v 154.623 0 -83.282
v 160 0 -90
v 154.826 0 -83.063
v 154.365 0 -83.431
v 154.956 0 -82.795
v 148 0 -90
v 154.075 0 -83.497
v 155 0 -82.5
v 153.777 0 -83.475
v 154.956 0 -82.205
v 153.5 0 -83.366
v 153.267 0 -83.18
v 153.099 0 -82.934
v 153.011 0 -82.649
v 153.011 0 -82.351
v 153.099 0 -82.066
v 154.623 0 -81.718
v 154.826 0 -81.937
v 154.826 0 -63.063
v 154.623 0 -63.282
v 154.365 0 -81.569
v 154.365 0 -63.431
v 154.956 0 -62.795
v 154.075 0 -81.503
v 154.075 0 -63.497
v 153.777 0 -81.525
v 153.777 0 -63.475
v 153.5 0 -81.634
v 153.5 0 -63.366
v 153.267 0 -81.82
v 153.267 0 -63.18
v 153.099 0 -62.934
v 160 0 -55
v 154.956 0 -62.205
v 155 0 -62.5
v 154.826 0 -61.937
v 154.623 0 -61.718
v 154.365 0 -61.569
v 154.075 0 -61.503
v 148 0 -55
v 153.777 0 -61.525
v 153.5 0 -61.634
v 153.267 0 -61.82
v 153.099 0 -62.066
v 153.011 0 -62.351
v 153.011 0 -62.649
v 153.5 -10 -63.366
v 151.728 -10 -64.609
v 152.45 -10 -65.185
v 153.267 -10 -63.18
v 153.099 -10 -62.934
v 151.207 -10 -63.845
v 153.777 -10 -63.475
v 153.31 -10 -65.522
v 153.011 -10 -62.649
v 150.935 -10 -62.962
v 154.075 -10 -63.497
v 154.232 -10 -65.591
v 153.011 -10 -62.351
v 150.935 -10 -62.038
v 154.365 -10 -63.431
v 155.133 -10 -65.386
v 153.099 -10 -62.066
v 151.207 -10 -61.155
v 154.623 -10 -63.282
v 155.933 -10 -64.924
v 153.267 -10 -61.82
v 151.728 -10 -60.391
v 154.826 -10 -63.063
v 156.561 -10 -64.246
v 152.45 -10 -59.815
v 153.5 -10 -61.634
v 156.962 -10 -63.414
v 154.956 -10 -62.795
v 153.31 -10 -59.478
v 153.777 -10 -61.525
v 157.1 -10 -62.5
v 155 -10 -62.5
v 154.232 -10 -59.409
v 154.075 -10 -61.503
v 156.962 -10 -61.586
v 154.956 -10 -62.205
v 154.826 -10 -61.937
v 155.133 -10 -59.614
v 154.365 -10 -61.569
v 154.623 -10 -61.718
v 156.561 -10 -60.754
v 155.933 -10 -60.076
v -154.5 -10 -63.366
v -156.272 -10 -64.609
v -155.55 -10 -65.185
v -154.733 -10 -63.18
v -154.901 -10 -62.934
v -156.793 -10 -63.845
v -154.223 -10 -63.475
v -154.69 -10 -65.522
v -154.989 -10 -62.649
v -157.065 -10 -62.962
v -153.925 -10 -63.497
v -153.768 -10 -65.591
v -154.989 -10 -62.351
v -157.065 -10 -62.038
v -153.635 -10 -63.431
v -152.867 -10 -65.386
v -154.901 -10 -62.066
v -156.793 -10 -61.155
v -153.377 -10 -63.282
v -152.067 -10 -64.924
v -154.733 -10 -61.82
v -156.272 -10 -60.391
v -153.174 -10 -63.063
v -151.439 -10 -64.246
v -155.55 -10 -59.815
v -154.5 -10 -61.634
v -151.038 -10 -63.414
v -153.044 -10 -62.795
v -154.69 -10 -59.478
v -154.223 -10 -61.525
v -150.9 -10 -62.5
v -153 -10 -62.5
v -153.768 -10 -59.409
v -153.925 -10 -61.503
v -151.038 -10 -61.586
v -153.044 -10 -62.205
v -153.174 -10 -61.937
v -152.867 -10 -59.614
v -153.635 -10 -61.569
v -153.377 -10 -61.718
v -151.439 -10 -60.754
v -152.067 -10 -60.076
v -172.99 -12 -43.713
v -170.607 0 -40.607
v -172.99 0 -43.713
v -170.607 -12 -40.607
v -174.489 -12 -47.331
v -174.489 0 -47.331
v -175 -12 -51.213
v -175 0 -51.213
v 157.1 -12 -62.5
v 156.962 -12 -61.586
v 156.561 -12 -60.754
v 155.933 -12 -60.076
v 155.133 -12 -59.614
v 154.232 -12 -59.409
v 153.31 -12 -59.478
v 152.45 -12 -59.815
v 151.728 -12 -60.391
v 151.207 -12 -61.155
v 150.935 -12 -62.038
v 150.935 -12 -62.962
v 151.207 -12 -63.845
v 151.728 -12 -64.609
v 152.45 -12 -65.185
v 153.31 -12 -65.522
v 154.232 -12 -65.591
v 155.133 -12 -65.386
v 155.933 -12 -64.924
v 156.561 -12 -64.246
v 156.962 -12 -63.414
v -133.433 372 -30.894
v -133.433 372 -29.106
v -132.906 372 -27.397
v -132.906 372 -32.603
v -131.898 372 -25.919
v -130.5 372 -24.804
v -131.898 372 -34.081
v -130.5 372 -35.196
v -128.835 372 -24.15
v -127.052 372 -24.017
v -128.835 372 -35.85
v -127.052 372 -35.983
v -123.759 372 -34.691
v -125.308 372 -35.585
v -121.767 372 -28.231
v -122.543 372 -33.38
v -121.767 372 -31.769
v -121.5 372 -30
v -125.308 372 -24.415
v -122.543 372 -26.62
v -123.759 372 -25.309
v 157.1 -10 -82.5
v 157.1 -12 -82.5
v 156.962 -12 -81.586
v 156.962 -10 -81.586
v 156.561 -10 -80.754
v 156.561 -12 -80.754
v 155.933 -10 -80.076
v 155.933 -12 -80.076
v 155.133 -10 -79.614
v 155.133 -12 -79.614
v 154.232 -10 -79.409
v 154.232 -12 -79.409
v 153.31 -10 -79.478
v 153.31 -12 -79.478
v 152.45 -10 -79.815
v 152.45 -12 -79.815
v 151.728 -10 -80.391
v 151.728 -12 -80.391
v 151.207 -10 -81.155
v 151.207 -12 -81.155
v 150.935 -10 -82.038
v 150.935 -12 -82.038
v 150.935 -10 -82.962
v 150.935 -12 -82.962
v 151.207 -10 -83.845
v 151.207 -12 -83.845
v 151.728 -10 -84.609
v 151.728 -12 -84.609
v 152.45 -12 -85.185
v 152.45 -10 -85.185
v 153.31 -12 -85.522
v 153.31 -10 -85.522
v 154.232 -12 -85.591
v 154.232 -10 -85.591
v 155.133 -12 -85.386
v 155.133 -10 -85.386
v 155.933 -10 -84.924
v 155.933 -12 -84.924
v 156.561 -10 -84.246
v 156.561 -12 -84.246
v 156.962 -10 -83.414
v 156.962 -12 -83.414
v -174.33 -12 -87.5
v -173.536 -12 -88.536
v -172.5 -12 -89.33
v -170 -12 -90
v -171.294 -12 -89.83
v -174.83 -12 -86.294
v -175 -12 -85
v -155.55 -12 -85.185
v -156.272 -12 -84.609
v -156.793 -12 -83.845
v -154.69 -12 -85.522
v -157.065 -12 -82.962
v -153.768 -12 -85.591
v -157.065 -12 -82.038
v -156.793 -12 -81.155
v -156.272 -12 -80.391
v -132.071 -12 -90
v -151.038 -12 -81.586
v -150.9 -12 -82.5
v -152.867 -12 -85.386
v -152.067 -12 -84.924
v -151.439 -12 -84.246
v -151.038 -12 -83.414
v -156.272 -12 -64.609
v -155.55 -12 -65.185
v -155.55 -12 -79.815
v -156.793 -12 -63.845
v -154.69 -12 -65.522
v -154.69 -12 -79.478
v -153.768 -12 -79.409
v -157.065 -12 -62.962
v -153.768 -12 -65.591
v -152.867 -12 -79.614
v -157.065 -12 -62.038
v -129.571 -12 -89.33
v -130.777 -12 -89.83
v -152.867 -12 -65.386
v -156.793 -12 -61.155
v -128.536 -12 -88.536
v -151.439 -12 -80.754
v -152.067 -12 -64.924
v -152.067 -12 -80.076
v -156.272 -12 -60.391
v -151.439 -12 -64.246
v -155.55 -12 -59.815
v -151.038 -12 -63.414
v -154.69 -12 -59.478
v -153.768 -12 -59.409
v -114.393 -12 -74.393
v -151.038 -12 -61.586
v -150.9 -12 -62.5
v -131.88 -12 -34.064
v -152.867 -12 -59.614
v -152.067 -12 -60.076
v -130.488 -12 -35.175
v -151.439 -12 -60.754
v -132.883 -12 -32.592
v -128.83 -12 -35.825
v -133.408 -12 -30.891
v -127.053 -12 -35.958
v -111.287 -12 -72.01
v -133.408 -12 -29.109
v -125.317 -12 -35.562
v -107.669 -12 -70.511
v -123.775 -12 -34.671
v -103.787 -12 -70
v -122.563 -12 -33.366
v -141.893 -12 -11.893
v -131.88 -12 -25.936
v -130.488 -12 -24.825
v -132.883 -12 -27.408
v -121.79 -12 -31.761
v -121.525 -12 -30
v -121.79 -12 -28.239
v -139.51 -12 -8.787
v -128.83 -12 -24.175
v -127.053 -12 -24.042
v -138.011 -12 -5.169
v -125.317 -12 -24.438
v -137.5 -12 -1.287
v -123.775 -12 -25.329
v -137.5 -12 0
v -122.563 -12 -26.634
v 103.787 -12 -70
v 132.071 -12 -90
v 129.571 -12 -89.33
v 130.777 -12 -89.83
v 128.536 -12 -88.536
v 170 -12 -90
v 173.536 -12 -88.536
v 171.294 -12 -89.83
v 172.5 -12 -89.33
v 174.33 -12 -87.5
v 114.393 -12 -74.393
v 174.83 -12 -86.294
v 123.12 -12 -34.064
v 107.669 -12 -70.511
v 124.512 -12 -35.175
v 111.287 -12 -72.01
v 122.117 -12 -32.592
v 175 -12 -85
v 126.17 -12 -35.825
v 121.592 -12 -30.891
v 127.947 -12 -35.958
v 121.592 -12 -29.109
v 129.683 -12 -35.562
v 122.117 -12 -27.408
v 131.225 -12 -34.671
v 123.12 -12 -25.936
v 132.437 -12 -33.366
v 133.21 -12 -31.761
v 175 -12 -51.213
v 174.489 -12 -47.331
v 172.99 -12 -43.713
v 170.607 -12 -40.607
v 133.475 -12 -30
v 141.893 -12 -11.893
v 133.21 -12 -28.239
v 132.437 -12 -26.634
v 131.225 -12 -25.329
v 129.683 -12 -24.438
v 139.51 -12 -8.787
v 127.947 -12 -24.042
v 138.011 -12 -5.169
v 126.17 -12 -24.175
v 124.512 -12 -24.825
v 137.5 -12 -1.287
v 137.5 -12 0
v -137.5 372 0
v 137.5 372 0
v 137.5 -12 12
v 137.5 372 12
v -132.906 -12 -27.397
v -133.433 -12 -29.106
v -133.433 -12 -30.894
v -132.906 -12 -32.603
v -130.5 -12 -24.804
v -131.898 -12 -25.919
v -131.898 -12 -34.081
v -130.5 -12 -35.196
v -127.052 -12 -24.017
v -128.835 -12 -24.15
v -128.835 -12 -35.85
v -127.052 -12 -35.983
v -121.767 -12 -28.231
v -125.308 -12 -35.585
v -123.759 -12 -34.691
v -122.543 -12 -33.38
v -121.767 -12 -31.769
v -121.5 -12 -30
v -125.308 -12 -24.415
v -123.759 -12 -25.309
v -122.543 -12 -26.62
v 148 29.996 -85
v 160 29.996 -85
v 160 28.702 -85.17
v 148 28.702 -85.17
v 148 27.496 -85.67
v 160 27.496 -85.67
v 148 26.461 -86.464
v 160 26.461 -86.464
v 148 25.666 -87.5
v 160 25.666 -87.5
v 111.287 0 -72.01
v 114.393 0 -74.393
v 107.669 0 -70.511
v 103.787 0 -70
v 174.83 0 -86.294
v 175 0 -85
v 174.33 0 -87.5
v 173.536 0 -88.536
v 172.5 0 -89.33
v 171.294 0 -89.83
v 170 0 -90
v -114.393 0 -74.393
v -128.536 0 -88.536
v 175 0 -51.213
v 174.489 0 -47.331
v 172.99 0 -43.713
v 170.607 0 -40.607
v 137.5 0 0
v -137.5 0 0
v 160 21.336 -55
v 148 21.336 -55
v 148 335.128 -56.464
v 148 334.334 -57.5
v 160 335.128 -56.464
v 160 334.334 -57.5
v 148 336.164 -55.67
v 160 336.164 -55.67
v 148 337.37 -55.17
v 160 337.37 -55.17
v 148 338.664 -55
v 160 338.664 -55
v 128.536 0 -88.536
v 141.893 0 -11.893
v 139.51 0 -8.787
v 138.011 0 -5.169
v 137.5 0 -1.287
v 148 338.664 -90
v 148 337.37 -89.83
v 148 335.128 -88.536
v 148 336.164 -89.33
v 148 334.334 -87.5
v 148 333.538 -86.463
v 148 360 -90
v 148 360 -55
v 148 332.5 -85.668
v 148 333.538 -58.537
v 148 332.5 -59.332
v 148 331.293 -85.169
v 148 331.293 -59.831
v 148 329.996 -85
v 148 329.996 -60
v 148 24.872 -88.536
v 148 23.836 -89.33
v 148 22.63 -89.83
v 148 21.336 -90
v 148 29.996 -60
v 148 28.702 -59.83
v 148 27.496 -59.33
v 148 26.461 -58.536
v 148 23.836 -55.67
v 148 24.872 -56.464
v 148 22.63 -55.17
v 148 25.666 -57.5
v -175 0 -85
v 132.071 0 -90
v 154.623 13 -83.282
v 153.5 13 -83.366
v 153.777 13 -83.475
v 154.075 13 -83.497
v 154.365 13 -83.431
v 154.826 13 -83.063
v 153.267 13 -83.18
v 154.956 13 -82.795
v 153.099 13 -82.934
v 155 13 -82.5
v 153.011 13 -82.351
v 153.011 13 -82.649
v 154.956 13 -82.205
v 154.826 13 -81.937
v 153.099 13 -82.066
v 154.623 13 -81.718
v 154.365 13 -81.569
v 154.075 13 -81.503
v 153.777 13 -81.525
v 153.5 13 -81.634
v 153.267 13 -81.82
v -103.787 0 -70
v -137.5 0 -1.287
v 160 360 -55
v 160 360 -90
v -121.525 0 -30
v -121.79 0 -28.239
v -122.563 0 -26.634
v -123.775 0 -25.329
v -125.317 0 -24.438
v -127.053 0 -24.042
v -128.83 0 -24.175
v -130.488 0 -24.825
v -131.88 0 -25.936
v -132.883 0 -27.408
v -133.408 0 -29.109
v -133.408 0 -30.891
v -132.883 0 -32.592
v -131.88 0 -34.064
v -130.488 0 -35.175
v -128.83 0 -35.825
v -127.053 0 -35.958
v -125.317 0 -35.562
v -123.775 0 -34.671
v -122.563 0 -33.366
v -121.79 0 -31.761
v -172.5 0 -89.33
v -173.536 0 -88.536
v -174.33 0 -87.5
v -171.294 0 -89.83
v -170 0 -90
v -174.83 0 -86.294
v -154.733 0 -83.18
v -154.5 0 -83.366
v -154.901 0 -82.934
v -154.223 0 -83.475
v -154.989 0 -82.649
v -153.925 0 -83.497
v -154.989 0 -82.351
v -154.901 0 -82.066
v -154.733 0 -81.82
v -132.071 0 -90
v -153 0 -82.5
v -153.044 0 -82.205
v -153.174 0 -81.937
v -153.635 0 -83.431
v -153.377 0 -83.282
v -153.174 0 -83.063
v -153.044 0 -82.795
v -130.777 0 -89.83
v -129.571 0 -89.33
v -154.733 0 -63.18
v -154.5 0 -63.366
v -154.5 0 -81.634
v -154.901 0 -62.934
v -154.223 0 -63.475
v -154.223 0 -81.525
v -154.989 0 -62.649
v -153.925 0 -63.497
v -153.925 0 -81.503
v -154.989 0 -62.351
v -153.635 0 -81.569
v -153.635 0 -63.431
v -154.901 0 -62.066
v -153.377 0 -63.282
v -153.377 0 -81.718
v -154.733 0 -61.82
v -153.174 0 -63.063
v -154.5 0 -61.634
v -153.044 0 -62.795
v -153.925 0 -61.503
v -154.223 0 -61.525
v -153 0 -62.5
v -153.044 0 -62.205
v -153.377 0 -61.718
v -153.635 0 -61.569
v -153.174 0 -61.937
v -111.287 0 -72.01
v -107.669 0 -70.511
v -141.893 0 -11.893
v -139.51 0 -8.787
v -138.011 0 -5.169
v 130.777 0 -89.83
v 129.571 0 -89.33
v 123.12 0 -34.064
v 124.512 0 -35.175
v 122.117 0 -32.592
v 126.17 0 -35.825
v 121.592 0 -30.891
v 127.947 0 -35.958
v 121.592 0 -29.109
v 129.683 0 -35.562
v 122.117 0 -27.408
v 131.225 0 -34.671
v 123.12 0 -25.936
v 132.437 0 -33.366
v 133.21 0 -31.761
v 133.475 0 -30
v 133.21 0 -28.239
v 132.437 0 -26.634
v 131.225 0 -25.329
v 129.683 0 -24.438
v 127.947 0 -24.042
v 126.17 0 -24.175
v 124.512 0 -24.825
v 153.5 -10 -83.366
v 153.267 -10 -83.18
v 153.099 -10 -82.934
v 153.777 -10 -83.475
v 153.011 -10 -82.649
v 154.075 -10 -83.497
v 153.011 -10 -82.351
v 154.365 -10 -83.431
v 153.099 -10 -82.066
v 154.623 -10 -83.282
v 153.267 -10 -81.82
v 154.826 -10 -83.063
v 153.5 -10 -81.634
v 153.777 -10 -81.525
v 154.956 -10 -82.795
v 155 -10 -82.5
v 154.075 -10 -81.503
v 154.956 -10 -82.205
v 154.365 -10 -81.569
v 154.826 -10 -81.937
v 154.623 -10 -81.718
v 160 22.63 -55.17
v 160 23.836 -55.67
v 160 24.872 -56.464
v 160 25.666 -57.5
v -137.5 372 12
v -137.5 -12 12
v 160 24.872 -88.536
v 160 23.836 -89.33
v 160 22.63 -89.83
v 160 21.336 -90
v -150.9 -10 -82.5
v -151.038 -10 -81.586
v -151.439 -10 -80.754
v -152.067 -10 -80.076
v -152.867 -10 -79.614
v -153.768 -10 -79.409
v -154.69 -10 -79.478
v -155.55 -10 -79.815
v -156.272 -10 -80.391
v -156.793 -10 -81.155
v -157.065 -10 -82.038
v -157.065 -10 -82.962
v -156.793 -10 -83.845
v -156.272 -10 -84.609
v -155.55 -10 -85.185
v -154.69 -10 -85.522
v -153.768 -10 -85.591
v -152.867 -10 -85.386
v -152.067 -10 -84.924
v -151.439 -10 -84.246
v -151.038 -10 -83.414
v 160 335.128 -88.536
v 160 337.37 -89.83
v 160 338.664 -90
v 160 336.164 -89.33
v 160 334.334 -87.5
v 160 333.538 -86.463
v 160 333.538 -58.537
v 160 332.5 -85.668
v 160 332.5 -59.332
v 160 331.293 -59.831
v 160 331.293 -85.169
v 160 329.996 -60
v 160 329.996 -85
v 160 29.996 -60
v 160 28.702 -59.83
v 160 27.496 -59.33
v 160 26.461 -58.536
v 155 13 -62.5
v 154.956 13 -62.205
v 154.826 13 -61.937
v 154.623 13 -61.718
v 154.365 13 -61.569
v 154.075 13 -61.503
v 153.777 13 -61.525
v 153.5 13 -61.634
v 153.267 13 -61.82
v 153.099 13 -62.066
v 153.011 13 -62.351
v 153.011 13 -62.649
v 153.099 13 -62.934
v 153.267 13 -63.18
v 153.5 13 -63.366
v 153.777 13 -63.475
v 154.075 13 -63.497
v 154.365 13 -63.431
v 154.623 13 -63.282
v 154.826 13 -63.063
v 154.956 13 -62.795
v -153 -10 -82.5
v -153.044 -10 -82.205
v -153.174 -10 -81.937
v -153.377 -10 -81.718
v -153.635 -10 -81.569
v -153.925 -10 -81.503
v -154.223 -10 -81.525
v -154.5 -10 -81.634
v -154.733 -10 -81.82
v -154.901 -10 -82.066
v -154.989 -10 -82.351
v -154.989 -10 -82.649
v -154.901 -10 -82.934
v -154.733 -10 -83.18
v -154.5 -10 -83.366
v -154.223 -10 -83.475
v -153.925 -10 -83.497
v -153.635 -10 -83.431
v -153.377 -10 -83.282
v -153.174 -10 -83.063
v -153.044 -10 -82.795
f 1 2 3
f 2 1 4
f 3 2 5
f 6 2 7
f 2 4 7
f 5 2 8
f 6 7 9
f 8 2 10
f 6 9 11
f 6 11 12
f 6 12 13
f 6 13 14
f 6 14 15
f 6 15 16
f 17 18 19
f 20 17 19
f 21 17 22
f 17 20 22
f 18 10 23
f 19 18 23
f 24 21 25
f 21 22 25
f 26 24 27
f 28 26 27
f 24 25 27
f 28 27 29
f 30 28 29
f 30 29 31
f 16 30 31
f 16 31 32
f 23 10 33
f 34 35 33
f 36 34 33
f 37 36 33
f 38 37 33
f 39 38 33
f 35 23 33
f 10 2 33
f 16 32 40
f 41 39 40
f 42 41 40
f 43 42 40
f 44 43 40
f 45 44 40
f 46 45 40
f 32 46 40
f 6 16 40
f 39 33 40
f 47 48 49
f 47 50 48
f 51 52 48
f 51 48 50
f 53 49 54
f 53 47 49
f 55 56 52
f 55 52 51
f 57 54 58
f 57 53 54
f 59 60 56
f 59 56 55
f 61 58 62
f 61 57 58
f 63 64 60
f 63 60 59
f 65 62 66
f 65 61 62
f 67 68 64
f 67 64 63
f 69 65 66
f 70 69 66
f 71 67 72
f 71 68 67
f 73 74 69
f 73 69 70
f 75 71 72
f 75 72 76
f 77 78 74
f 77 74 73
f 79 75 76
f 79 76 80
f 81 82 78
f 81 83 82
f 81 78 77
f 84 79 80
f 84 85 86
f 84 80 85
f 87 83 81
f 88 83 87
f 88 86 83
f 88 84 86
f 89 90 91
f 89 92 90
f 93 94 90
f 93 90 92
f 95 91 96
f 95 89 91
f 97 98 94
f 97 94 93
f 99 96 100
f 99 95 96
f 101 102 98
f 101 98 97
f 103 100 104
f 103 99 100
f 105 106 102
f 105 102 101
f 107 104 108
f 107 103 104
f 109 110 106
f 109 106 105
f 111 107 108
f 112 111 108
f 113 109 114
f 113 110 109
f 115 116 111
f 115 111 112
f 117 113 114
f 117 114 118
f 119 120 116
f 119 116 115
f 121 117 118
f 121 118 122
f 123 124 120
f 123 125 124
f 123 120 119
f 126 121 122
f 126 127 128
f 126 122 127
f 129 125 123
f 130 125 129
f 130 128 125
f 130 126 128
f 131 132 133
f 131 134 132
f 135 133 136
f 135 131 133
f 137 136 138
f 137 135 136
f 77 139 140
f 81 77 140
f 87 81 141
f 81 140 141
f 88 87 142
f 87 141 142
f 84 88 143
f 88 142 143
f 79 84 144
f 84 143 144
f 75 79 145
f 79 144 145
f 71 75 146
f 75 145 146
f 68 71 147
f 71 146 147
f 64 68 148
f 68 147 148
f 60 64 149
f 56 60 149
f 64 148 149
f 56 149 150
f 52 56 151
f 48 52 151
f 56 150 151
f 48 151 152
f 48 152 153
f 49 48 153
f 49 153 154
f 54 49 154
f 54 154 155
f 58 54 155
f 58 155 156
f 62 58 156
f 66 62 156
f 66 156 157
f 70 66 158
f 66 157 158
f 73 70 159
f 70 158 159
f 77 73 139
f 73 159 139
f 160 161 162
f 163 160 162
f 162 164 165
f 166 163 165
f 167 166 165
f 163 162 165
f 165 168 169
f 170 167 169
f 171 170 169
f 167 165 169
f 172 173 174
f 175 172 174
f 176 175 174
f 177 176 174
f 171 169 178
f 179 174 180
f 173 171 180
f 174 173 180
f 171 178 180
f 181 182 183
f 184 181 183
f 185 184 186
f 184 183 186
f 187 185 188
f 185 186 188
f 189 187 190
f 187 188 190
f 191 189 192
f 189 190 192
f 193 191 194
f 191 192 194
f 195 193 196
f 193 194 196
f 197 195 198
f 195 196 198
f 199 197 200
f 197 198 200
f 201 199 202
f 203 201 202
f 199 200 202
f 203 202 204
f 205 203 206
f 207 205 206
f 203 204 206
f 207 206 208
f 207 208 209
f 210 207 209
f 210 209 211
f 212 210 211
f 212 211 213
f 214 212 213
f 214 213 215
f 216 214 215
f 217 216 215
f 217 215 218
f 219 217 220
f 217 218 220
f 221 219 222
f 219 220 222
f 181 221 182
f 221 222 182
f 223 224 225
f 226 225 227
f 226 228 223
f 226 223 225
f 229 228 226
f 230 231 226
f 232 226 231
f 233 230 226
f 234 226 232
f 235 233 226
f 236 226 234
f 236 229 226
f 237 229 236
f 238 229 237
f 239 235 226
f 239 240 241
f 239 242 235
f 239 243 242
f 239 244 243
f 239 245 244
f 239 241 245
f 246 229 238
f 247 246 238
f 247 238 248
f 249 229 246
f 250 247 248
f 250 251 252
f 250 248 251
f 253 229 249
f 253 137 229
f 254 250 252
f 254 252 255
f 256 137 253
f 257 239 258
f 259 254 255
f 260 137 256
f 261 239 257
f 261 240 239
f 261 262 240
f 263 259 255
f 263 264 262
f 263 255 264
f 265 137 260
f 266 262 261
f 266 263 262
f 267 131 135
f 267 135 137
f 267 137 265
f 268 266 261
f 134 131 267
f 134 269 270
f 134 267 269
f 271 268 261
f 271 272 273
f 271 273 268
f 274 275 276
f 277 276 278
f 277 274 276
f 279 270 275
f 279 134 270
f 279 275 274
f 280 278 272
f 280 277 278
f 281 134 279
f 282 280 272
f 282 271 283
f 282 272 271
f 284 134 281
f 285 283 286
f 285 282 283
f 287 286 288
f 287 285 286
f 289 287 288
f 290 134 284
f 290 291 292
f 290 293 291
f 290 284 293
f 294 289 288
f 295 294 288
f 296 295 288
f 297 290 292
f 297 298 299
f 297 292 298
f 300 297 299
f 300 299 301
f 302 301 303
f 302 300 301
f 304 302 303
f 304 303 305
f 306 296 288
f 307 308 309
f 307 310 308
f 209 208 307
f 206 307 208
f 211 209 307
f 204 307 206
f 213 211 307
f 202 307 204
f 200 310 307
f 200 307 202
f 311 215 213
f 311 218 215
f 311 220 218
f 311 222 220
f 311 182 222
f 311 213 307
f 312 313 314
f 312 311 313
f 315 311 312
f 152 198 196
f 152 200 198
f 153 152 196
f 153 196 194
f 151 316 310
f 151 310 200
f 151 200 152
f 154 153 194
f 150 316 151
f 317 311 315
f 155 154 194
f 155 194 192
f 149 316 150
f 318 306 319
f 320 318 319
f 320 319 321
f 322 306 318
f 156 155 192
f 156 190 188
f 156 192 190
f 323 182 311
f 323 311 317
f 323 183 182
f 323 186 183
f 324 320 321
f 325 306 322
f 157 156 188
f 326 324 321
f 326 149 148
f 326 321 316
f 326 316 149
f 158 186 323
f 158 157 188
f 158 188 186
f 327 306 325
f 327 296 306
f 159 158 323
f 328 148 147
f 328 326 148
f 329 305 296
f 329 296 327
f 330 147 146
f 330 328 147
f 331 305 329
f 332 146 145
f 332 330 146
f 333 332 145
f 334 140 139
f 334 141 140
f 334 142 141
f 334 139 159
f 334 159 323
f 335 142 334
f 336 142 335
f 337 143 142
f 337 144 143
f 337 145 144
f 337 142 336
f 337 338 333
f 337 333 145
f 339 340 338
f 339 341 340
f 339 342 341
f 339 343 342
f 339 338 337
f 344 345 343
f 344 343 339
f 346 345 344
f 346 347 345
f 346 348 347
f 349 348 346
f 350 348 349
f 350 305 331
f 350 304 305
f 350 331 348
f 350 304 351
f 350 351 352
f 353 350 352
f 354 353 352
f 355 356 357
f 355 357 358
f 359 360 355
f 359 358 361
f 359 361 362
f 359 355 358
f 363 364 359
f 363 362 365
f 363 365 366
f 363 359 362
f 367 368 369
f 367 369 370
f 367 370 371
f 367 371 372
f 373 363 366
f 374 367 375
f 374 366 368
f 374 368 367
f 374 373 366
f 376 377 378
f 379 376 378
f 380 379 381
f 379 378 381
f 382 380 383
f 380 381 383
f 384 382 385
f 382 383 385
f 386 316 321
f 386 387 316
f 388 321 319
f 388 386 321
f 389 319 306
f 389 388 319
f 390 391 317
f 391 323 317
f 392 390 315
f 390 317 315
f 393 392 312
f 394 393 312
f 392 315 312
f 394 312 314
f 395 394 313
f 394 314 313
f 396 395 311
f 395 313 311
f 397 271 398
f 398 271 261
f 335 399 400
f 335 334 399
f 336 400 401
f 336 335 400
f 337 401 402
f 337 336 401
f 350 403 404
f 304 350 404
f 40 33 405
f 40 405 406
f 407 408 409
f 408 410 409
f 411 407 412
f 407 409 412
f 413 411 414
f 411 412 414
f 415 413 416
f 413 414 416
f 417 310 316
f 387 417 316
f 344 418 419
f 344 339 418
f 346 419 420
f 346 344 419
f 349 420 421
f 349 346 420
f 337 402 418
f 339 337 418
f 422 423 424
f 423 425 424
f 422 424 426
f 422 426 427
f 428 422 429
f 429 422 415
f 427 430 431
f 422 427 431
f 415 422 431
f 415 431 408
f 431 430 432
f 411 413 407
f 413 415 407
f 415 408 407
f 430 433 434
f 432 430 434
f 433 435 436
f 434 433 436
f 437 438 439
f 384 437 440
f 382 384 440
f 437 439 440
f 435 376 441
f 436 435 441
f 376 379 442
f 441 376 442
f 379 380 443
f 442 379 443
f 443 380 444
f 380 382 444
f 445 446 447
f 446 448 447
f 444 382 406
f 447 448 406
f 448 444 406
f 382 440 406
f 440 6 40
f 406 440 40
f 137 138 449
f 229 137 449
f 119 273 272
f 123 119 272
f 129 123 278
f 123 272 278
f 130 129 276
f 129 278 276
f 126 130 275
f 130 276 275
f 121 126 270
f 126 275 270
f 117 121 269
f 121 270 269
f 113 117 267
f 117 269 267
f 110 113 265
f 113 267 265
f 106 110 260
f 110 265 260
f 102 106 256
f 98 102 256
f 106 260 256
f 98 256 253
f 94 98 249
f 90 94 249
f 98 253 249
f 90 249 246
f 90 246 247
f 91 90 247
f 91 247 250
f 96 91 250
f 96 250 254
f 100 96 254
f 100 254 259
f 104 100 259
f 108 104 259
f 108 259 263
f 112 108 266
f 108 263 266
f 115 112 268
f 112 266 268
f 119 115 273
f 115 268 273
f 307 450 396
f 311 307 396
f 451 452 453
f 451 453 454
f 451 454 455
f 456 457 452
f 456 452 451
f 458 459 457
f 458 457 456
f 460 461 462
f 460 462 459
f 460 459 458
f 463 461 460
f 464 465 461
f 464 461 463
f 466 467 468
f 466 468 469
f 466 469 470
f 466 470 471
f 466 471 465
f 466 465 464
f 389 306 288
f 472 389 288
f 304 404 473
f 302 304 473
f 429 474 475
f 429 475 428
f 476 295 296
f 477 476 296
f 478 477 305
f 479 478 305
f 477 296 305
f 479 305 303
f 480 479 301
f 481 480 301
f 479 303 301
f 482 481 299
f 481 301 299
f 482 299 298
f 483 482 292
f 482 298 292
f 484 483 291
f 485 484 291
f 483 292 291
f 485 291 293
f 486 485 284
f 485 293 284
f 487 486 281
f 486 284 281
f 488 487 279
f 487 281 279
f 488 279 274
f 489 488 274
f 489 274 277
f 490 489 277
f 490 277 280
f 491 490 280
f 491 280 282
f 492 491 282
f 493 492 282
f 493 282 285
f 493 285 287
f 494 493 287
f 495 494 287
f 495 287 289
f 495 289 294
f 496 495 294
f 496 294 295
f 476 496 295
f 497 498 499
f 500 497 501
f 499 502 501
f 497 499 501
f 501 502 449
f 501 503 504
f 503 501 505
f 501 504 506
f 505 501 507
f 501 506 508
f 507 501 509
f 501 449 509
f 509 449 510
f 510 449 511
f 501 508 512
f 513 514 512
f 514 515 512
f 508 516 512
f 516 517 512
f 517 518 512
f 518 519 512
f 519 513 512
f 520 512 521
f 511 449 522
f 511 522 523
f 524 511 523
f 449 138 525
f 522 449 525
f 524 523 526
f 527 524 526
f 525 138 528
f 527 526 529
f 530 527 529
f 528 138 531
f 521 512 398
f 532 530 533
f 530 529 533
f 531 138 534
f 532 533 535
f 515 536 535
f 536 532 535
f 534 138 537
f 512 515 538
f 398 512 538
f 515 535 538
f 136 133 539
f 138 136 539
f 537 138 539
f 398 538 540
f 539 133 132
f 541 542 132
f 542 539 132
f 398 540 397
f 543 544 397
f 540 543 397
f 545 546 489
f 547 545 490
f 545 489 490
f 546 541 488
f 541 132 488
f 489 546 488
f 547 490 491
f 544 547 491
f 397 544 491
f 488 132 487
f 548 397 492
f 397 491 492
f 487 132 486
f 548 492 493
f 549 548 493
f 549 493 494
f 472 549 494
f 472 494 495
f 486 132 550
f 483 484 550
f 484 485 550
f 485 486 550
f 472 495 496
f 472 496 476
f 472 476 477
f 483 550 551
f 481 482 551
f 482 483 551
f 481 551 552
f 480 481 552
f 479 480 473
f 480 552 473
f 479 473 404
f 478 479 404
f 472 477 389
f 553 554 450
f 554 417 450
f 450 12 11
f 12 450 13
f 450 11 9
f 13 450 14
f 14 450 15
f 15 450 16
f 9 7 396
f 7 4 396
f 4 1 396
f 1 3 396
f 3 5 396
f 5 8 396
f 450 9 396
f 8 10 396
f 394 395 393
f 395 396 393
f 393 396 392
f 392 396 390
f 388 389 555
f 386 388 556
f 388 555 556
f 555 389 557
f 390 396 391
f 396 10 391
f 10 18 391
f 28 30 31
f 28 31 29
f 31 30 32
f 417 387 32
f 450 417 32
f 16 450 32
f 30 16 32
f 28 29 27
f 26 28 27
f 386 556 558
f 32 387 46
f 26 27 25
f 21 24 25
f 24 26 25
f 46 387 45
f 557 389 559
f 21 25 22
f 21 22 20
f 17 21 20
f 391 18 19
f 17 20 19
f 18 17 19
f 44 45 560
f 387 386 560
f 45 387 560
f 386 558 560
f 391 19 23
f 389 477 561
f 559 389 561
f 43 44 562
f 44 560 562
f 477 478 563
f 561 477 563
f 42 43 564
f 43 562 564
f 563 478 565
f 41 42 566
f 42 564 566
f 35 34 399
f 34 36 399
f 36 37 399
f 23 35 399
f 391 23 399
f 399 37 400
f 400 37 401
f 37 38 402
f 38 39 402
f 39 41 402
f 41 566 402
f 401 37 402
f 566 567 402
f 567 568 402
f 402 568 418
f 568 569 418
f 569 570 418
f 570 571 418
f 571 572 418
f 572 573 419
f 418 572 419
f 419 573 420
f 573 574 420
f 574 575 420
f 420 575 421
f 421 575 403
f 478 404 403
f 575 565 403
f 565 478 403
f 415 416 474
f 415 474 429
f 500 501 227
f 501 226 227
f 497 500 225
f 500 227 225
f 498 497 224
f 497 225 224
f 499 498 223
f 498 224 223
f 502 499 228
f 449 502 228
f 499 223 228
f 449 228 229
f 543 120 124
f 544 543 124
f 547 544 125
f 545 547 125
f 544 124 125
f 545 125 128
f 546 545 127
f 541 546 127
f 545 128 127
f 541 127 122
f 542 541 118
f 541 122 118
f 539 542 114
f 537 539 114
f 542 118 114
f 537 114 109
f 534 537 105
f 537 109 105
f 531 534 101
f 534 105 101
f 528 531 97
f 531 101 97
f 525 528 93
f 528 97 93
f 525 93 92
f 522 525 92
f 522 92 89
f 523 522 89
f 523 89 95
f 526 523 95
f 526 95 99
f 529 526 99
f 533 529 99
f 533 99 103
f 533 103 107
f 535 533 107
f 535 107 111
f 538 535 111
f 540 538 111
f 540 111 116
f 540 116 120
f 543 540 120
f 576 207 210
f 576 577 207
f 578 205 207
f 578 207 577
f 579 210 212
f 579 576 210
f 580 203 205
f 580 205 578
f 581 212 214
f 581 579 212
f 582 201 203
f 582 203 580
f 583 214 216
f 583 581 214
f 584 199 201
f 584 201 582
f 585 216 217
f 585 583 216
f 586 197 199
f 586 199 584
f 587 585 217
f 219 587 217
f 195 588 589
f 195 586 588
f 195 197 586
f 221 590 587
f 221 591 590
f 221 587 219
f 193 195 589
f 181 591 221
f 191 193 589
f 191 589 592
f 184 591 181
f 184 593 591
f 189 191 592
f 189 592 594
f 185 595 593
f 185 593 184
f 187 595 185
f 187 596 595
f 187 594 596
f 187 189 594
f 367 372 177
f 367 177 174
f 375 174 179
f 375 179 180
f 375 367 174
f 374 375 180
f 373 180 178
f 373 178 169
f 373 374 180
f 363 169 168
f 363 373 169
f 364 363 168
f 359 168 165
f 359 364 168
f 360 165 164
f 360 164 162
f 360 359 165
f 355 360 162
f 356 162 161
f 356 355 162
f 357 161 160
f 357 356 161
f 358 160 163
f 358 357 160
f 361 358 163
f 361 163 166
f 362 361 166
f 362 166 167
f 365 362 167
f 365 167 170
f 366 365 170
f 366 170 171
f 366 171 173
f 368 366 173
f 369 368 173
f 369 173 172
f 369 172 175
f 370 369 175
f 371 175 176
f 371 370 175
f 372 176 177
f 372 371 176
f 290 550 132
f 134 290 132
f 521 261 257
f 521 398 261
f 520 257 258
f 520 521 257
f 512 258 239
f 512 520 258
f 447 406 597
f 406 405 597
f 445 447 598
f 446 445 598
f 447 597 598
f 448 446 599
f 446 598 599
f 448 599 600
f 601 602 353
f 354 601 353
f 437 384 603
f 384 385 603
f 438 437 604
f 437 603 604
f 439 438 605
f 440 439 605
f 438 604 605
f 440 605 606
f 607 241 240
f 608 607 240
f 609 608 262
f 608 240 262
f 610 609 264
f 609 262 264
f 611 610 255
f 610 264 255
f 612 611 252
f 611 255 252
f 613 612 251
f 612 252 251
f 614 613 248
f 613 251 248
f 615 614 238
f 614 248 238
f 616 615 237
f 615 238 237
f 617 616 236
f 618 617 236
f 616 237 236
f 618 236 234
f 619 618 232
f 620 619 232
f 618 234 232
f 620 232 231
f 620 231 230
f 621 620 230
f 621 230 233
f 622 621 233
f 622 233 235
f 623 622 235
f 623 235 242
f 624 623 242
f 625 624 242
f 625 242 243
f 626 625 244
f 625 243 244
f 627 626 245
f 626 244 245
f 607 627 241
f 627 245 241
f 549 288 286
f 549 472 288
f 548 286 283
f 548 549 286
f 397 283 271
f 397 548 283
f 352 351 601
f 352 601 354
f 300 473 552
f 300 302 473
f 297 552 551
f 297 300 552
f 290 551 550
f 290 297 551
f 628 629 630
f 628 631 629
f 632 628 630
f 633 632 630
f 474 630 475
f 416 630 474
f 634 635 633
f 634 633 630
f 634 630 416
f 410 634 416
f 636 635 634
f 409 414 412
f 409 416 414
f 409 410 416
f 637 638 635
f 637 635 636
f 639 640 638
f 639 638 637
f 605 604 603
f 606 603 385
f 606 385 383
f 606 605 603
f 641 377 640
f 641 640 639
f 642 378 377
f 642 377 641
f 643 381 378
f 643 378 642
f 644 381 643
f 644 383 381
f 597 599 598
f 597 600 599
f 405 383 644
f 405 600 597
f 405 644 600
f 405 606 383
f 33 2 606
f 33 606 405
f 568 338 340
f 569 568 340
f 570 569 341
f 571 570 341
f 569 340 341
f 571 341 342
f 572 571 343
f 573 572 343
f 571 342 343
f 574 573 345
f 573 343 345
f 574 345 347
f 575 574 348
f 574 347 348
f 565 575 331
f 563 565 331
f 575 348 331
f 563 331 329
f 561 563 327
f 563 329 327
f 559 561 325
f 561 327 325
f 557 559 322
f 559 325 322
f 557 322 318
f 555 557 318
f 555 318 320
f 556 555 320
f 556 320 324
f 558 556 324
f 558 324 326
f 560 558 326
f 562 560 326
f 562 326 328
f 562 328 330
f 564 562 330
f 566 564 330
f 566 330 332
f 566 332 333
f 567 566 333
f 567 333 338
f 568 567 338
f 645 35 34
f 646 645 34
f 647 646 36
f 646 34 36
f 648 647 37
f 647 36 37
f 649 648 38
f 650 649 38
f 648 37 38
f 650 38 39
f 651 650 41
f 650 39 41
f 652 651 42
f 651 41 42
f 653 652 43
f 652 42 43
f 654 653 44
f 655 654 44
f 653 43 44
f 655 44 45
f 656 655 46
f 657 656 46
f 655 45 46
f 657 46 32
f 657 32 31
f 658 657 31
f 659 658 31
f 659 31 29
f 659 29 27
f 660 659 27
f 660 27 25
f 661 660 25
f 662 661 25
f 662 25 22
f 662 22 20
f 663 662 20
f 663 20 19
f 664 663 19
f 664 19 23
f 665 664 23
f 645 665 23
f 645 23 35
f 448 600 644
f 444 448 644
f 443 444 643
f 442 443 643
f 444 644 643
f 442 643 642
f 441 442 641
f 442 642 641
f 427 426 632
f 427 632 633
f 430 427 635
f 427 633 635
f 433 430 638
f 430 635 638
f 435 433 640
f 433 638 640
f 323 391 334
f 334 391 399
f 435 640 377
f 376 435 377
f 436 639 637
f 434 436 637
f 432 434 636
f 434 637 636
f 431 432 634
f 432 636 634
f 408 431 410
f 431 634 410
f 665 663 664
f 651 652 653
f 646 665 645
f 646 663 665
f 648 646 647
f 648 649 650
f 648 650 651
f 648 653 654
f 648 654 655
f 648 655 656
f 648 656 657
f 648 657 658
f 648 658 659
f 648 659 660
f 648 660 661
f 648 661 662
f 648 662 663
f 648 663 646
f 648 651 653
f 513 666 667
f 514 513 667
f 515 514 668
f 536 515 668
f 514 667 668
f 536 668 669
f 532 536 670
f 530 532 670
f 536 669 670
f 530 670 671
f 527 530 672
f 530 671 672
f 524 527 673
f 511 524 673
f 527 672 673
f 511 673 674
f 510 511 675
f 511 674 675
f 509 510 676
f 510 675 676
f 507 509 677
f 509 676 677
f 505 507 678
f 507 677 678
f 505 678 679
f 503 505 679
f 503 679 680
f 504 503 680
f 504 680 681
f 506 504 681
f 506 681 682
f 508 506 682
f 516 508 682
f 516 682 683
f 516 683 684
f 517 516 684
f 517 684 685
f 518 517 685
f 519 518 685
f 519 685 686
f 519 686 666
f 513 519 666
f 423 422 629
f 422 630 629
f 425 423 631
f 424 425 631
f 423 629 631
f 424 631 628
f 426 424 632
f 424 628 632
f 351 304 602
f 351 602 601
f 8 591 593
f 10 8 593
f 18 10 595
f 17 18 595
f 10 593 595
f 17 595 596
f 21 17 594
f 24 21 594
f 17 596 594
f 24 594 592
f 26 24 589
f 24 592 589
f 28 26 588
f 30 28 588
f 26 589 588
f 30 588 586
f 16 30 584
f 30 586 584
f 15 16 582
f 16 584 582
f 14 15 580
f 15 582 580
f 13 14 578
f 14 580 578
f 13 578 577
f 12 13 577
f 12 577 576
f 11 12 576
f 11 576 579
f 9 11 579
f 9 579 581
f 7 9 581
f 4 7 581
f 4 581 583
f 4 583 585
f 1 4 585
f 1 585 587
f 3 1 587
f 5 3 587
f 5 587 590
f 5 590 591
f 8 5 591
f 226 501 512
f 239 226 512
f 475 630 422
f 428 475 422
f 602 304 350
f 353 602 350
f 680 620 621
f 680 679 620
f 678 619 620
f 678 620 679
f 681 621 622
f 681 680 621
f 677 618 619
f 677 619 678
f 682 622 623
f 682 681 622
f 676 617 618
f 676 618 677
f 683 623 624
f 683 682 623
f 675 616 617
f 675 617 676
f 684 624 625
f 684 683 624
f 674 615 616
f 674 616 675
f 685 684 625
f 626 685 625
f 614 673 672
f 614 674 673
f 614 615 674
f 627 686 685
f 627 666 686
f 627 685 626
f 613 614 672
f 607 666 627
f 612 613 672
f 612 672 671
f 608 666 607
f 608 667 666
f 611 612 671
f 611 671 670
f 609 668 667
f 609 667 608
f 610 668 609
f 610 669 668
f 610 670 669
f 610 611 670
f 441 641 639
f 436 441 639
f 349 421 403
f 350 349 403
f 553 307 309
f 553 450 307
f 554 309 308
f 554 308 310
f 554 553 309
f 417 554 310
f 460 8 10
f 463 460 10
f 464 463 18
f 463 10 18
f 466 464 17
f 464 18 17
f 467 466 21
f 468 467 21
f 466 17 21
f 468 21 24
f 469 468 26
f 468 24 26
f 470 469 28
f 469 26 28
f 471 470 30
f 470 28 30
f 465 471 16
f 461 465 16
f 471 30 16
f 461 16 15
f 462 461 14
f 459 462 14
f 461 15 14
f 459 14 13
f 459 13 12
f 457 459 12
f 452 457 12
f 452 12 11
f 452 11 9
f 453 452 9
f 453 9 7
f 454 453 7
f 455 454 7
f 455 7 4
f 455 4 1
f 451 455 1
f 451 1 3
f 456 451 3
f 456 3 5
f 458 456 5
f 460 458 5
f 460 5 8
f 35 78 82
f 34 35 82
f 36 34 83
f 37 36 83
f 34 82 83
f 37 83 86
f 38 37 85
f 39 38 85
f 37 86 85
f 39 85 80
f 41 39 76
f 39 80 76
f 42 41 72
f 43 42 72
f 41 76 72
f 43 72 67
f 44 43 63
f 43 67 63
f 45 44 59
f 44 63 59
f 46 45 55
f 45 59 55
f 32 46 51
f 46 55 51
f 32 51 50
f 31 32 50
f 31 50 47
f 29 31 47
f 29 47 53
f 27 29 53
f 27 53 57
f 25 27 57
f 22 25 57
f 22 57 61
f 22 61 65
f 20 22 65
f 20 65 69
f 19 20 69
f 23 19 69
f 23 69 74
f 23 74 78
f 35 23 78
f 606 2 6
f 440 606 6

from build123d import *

# Parameters (mm, degrees)
F1_DEPTH  = 12
F2_R      = 5.975
F3_DEPTH  = 25
F4_R      = 6
F5_DEPTH  = 384
F6_W      = 275
F6_H      = 384
F7_DEPTH  = 12
F8_R      = 5
F9_R      = 15
F10_W     = 12
F10_H     = 35
F11_DEPTH = 360
F12_R     = 1
F13_DEPTH = 25
F14_R     = 3.1
F15_DEPTH = 2
F17_DEPTH = 25
F18_R     = 5


with BuildPart() as f1:
    # F0 (on Front) → F1 (new body)
    with BuildSketch(Plane.XZ):
        Polygon((137.5, 0), (-137.5, 0), (-137.5, -7.5), (-175, -45), (-175, -90), (175, -90), (175, -45), (137.5, -7.5), align=None)
    extrude(amount=F1_DEPTH)

    # F2 (on face) → F3 (cut)
    with BuildSketch(Plane.XZ.offset(12)):
        with Locations((-127.5, -30)):
            Circle(F2_R)
        with Locations((127.5, -30)):
            Circle(F2_R)
        Polygon((0, -70), (-110, -70), (-130, -90), (0, -90), (130, -90), (110, -70), align=None)
    extrude(amount=-F3_DEPTH, mode=Mode.SUBTRACT)

    # F8
    f8_edges = [f1.edges().sort_by_distance(p)[0] for p in [
        (-130, -6, -90),
        (130, -6, -90),
        (175, -6, -90),
        (-175, -6, -90),
    ]]
    fillet(f8_edges, radius=F8_R)

    # F9
    f9_edges = [f1.edges().sort_by_distance(p)[0] for p in [
        (-137.5, -6, -7.5),
        (-175, -6, -45),
        (137.5, -6, -7.5),
        (175, -6, -45),
        (-110, -6, -70),
        (110, -6, -70),
    ]]
    fillet(f9_edges, radius=F9_R)


with BuildPart() as f5:
    # F4 (on face) → F5 (new body)
    with BuildSketch(Plane.XZ.offset(12)):
        with Locations((-127.5, -30)):
            Circle(F4_R)
    extrude(amount=-F5_DEPTH)


with BuildPart() as f7:
    # F6 (on face) → F7 (new body)
    with BuildSketch(Plane.XY):
        with Locations((0, 180)):
            Rectangle(F6_W, F6_H)
    extrude(amount=F7_DEPTH)


with BuildPart() as f11:
    # F10 (on face) → F11 (new body)
    with BuildSketch(Plane(origin=(0, 0, 0), x_dir=(-1, 0, 0), z_dir=(0, 1, 0))):
        with Locations((-154, -72.5)):
            Rectangle(F10_W, F10_H)
    extrude(amount=F11_DEPTH)


with BuildPart() as f13_tool:
    # F12 (on face) → F13 (new body)
    with BuildSketch(Plane.XZ.offset(12)):
        with Locations((154, -82.5)):
            Circle(F12_R)
        with Locations((154, -62.5)):
            Circle(F12_R)
        with Locations((-154, -82.5)):
            Circle(F12_R)
        with Locations((-154, -62.5)):
            Circle(F12_R)
    extrude(amount=-F13_DEPTH)


with BuildPart() as f1_1:
    add(f1.part)

    # F13: cut by f13_tool
    add(f13_tool.part, mode=Mode.SUBTRACT)

    # F14 (on face) → F15 (cut)
    with BuildSketch(Plane.XZ.offset(12)):
        with Locations((154, -62.5)):
            Circle(F14_R)
        with Locations((154, -82.5)):
            Circle(F14_R)
        with Locations((-154, -62.5)):
            Circle(F14_R)
        with Locations((-154, -82.5)):
            Circle(F14_R)
    extrude(amount=-F15_DEPTH, mode=Mode.SUBTRACT)


with BuildPart() as f11_1:
    add(f11.part)

    # F13: cut by f13_tool
    add(f13_tool.part, mode=Mode.SUBTRACT)

    # F16 (on face) → F17 (cut)
    with BuildSketch(Plane.YZ.offset(160)):
        with BuildLine():
            Line((330.0105456627, -50), (29.9964847791, -50))
            ThreePointArc((29.9964847791, -50), (24.9964847791, -55), (29.9964847791, -60))
            Line((29.9964847791, -60), (329.9964847791, -60))
            ThreePointArc((329.9964847791, -60), (335.0035152209, -55.0070304418), (330.0105456627, -50))
        make_face()
        with BuildLine():
            ThreePointArc((330.0105456627, -95), (335.0035152209, -89.9929695582), (329.9964847791, -85))
            Line((329.9964847791, -85), (29.9964847791, -85))
            ThreePointArc((29.9964847791, -85), (24.9964847791, -90), (29.9964847791, -95))
            Line((29.9964847791, -95), (330.0105456627, -95))
        make_face()
    extrude(amount=-F17_DEPTH, mode=Mode.SUBTRACT)

    # F18
    f18_edges = [f11_1.edges().sort_by_distance(p)[0] for p in [
        (154, 24.996485, -55),
        (154, 24.996485, -90),
        (154, 335.00352, -90),
        (154, 335.00352, -55),
    ]]
    fillet(f18_edges, radius=F18_R)


solid = Compound([f5.part, f7.part, f1_1.part, f11_1.part])
